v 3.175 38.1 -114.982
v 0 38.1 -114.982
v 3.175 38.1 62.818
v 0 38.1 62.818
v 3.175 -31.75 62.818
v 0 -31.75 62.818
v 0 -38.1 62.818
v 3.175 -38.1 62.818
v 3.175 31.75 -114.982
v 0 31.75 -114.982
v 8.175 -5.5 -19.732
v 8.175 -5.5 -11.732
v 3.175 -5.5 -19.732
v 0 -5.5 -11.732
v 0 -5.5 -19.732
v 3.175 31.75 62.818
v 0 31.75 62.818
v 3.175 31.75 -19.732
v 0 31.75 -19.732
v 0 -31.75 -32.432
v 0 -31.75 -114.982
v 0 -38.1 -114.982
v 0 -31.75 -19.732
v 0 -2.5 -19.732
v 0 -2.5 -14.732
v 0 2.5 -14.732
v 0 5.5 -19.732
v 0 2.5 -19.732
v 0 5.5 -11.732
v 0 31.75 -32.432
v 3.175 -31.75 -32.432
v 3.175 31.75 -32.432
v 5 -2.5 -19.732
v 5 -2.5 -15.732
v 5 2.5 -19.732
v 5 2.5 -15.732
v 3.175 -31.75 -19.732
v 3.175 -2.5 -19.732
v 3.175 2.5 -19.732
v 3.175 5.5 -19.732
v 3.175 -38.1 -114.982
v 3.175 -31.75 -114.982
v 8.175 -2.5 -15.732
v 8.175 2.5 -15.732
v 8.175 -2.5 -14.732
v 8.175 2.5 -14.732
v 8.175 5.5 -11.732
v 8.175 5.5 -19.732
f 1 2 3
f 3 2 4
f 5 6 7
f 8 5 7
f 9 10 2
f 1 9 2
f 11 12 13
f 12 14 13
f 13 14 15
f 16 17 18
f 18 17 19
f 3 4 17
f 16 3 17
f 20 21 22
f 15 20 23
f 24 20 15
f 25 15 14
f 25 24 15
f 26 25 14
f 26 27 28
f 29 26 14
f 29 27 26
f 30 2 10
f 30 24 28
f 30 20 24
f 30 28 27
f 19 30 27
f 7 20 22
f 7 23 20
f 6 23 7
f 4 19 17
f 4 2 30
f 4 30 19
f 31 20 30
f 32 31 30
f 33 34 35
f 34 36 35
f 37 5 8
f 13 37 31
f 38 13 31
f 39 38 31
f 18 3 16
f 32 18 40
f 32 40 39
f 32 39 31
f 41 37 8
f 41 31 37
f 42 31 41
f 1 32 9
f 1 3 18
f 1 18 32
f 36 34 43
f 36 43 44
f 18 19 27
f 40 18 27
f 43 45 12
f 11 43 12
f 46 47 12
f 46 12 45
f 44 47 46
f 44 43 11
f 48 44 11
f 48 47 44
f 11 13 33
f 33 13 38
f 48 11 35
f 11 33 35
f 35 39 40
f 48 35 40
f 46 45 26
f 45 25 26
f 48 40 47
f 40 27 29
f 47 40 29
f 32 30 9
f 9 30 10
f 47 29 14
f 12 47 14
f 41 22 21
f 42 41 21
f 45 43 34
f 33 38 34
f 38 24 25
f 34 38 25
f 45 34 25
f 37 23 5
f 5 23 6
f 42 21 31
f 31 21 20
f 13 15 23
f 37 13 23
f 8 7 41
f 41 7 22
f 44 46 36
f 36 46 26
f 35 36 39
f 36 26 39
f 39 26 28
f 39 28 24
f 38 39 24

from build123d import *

# Parameters (mm, degrees)
BOSS_EXTRUDE1_DEPTH = 3.175
BOSS_EXTRUDE2_DEPTH = 5
SKETCH4_W           = 4
SKETCH4_H           = 5
BOSS_EXTRUDE3_DEPTH = 3.175


with BuildPart() as part:
    # Sketch1 → Boss-Extrude1 (new body)
    with BuildSketch(Plane(origin=(0, 0, 0), x_dir=(0, 0, -1), z_dir=(1, 0, 0))):
        Polygon((19.732226513, 31.75), (19.732226513, 0), (32.432226513, 0), (32.432226513, 31.75), (114.982226513, 31.75), (114.982226513, 38.1), (-62.817773487, 38.1), (-62.817773487, 31.75), align=None)
        Polygon((32.432226513, 0), (19.732226513, 0), (19.732226513, -31.75), (-62.817773487, -31.75), (-62.817773487, -38.1), (114.982226513, -38.1), (114.982226513, -31.75), (32.432226513, -31.75), align=None)
    extrude(amount=BOSS_EXTRUDE1_DEPTH)

    # Sketch2 → Boss-Extrude2 (add)
    with BuildSketch(Plane.ZY):
        Polygon((-19.732226513, 5.5), (-19.732226513, 2.5), (-14.732226513, 2.5), (-14.732226513, -2.5), (-19.732226513, -2.5), (-19.732226513, -5.5), (-11.732226513, -5.5), (-11.732226513, 5.5), align=None)
    extrude(amount=-BOSS_EXTRUDE2_DEPTH)

    # Sketch4 → Boss-Extrude3 (add)
    with BuildSketch(Plane(origin=(5, 0, 0), x_dir=(0, 0, -1), z_dir=(1, 0, 0))):
        Polygon((11.732226513, 5.5), (11.732226513, -5.5), (19.732226513, -5.5), (19.732226513, -2.5), (14.732226513, -2.5), (14.732226513, 2.5), (19.732226513, 2.5), (19.732226513, 5.5), align=None)
        with Locations((17.732226513, 0)):
            Rectangle(SKETCH4_W, SKETCH4_H)
    extrude(amount=BOSS_EXTRUDE3_DEPTH)


solid = part.part
